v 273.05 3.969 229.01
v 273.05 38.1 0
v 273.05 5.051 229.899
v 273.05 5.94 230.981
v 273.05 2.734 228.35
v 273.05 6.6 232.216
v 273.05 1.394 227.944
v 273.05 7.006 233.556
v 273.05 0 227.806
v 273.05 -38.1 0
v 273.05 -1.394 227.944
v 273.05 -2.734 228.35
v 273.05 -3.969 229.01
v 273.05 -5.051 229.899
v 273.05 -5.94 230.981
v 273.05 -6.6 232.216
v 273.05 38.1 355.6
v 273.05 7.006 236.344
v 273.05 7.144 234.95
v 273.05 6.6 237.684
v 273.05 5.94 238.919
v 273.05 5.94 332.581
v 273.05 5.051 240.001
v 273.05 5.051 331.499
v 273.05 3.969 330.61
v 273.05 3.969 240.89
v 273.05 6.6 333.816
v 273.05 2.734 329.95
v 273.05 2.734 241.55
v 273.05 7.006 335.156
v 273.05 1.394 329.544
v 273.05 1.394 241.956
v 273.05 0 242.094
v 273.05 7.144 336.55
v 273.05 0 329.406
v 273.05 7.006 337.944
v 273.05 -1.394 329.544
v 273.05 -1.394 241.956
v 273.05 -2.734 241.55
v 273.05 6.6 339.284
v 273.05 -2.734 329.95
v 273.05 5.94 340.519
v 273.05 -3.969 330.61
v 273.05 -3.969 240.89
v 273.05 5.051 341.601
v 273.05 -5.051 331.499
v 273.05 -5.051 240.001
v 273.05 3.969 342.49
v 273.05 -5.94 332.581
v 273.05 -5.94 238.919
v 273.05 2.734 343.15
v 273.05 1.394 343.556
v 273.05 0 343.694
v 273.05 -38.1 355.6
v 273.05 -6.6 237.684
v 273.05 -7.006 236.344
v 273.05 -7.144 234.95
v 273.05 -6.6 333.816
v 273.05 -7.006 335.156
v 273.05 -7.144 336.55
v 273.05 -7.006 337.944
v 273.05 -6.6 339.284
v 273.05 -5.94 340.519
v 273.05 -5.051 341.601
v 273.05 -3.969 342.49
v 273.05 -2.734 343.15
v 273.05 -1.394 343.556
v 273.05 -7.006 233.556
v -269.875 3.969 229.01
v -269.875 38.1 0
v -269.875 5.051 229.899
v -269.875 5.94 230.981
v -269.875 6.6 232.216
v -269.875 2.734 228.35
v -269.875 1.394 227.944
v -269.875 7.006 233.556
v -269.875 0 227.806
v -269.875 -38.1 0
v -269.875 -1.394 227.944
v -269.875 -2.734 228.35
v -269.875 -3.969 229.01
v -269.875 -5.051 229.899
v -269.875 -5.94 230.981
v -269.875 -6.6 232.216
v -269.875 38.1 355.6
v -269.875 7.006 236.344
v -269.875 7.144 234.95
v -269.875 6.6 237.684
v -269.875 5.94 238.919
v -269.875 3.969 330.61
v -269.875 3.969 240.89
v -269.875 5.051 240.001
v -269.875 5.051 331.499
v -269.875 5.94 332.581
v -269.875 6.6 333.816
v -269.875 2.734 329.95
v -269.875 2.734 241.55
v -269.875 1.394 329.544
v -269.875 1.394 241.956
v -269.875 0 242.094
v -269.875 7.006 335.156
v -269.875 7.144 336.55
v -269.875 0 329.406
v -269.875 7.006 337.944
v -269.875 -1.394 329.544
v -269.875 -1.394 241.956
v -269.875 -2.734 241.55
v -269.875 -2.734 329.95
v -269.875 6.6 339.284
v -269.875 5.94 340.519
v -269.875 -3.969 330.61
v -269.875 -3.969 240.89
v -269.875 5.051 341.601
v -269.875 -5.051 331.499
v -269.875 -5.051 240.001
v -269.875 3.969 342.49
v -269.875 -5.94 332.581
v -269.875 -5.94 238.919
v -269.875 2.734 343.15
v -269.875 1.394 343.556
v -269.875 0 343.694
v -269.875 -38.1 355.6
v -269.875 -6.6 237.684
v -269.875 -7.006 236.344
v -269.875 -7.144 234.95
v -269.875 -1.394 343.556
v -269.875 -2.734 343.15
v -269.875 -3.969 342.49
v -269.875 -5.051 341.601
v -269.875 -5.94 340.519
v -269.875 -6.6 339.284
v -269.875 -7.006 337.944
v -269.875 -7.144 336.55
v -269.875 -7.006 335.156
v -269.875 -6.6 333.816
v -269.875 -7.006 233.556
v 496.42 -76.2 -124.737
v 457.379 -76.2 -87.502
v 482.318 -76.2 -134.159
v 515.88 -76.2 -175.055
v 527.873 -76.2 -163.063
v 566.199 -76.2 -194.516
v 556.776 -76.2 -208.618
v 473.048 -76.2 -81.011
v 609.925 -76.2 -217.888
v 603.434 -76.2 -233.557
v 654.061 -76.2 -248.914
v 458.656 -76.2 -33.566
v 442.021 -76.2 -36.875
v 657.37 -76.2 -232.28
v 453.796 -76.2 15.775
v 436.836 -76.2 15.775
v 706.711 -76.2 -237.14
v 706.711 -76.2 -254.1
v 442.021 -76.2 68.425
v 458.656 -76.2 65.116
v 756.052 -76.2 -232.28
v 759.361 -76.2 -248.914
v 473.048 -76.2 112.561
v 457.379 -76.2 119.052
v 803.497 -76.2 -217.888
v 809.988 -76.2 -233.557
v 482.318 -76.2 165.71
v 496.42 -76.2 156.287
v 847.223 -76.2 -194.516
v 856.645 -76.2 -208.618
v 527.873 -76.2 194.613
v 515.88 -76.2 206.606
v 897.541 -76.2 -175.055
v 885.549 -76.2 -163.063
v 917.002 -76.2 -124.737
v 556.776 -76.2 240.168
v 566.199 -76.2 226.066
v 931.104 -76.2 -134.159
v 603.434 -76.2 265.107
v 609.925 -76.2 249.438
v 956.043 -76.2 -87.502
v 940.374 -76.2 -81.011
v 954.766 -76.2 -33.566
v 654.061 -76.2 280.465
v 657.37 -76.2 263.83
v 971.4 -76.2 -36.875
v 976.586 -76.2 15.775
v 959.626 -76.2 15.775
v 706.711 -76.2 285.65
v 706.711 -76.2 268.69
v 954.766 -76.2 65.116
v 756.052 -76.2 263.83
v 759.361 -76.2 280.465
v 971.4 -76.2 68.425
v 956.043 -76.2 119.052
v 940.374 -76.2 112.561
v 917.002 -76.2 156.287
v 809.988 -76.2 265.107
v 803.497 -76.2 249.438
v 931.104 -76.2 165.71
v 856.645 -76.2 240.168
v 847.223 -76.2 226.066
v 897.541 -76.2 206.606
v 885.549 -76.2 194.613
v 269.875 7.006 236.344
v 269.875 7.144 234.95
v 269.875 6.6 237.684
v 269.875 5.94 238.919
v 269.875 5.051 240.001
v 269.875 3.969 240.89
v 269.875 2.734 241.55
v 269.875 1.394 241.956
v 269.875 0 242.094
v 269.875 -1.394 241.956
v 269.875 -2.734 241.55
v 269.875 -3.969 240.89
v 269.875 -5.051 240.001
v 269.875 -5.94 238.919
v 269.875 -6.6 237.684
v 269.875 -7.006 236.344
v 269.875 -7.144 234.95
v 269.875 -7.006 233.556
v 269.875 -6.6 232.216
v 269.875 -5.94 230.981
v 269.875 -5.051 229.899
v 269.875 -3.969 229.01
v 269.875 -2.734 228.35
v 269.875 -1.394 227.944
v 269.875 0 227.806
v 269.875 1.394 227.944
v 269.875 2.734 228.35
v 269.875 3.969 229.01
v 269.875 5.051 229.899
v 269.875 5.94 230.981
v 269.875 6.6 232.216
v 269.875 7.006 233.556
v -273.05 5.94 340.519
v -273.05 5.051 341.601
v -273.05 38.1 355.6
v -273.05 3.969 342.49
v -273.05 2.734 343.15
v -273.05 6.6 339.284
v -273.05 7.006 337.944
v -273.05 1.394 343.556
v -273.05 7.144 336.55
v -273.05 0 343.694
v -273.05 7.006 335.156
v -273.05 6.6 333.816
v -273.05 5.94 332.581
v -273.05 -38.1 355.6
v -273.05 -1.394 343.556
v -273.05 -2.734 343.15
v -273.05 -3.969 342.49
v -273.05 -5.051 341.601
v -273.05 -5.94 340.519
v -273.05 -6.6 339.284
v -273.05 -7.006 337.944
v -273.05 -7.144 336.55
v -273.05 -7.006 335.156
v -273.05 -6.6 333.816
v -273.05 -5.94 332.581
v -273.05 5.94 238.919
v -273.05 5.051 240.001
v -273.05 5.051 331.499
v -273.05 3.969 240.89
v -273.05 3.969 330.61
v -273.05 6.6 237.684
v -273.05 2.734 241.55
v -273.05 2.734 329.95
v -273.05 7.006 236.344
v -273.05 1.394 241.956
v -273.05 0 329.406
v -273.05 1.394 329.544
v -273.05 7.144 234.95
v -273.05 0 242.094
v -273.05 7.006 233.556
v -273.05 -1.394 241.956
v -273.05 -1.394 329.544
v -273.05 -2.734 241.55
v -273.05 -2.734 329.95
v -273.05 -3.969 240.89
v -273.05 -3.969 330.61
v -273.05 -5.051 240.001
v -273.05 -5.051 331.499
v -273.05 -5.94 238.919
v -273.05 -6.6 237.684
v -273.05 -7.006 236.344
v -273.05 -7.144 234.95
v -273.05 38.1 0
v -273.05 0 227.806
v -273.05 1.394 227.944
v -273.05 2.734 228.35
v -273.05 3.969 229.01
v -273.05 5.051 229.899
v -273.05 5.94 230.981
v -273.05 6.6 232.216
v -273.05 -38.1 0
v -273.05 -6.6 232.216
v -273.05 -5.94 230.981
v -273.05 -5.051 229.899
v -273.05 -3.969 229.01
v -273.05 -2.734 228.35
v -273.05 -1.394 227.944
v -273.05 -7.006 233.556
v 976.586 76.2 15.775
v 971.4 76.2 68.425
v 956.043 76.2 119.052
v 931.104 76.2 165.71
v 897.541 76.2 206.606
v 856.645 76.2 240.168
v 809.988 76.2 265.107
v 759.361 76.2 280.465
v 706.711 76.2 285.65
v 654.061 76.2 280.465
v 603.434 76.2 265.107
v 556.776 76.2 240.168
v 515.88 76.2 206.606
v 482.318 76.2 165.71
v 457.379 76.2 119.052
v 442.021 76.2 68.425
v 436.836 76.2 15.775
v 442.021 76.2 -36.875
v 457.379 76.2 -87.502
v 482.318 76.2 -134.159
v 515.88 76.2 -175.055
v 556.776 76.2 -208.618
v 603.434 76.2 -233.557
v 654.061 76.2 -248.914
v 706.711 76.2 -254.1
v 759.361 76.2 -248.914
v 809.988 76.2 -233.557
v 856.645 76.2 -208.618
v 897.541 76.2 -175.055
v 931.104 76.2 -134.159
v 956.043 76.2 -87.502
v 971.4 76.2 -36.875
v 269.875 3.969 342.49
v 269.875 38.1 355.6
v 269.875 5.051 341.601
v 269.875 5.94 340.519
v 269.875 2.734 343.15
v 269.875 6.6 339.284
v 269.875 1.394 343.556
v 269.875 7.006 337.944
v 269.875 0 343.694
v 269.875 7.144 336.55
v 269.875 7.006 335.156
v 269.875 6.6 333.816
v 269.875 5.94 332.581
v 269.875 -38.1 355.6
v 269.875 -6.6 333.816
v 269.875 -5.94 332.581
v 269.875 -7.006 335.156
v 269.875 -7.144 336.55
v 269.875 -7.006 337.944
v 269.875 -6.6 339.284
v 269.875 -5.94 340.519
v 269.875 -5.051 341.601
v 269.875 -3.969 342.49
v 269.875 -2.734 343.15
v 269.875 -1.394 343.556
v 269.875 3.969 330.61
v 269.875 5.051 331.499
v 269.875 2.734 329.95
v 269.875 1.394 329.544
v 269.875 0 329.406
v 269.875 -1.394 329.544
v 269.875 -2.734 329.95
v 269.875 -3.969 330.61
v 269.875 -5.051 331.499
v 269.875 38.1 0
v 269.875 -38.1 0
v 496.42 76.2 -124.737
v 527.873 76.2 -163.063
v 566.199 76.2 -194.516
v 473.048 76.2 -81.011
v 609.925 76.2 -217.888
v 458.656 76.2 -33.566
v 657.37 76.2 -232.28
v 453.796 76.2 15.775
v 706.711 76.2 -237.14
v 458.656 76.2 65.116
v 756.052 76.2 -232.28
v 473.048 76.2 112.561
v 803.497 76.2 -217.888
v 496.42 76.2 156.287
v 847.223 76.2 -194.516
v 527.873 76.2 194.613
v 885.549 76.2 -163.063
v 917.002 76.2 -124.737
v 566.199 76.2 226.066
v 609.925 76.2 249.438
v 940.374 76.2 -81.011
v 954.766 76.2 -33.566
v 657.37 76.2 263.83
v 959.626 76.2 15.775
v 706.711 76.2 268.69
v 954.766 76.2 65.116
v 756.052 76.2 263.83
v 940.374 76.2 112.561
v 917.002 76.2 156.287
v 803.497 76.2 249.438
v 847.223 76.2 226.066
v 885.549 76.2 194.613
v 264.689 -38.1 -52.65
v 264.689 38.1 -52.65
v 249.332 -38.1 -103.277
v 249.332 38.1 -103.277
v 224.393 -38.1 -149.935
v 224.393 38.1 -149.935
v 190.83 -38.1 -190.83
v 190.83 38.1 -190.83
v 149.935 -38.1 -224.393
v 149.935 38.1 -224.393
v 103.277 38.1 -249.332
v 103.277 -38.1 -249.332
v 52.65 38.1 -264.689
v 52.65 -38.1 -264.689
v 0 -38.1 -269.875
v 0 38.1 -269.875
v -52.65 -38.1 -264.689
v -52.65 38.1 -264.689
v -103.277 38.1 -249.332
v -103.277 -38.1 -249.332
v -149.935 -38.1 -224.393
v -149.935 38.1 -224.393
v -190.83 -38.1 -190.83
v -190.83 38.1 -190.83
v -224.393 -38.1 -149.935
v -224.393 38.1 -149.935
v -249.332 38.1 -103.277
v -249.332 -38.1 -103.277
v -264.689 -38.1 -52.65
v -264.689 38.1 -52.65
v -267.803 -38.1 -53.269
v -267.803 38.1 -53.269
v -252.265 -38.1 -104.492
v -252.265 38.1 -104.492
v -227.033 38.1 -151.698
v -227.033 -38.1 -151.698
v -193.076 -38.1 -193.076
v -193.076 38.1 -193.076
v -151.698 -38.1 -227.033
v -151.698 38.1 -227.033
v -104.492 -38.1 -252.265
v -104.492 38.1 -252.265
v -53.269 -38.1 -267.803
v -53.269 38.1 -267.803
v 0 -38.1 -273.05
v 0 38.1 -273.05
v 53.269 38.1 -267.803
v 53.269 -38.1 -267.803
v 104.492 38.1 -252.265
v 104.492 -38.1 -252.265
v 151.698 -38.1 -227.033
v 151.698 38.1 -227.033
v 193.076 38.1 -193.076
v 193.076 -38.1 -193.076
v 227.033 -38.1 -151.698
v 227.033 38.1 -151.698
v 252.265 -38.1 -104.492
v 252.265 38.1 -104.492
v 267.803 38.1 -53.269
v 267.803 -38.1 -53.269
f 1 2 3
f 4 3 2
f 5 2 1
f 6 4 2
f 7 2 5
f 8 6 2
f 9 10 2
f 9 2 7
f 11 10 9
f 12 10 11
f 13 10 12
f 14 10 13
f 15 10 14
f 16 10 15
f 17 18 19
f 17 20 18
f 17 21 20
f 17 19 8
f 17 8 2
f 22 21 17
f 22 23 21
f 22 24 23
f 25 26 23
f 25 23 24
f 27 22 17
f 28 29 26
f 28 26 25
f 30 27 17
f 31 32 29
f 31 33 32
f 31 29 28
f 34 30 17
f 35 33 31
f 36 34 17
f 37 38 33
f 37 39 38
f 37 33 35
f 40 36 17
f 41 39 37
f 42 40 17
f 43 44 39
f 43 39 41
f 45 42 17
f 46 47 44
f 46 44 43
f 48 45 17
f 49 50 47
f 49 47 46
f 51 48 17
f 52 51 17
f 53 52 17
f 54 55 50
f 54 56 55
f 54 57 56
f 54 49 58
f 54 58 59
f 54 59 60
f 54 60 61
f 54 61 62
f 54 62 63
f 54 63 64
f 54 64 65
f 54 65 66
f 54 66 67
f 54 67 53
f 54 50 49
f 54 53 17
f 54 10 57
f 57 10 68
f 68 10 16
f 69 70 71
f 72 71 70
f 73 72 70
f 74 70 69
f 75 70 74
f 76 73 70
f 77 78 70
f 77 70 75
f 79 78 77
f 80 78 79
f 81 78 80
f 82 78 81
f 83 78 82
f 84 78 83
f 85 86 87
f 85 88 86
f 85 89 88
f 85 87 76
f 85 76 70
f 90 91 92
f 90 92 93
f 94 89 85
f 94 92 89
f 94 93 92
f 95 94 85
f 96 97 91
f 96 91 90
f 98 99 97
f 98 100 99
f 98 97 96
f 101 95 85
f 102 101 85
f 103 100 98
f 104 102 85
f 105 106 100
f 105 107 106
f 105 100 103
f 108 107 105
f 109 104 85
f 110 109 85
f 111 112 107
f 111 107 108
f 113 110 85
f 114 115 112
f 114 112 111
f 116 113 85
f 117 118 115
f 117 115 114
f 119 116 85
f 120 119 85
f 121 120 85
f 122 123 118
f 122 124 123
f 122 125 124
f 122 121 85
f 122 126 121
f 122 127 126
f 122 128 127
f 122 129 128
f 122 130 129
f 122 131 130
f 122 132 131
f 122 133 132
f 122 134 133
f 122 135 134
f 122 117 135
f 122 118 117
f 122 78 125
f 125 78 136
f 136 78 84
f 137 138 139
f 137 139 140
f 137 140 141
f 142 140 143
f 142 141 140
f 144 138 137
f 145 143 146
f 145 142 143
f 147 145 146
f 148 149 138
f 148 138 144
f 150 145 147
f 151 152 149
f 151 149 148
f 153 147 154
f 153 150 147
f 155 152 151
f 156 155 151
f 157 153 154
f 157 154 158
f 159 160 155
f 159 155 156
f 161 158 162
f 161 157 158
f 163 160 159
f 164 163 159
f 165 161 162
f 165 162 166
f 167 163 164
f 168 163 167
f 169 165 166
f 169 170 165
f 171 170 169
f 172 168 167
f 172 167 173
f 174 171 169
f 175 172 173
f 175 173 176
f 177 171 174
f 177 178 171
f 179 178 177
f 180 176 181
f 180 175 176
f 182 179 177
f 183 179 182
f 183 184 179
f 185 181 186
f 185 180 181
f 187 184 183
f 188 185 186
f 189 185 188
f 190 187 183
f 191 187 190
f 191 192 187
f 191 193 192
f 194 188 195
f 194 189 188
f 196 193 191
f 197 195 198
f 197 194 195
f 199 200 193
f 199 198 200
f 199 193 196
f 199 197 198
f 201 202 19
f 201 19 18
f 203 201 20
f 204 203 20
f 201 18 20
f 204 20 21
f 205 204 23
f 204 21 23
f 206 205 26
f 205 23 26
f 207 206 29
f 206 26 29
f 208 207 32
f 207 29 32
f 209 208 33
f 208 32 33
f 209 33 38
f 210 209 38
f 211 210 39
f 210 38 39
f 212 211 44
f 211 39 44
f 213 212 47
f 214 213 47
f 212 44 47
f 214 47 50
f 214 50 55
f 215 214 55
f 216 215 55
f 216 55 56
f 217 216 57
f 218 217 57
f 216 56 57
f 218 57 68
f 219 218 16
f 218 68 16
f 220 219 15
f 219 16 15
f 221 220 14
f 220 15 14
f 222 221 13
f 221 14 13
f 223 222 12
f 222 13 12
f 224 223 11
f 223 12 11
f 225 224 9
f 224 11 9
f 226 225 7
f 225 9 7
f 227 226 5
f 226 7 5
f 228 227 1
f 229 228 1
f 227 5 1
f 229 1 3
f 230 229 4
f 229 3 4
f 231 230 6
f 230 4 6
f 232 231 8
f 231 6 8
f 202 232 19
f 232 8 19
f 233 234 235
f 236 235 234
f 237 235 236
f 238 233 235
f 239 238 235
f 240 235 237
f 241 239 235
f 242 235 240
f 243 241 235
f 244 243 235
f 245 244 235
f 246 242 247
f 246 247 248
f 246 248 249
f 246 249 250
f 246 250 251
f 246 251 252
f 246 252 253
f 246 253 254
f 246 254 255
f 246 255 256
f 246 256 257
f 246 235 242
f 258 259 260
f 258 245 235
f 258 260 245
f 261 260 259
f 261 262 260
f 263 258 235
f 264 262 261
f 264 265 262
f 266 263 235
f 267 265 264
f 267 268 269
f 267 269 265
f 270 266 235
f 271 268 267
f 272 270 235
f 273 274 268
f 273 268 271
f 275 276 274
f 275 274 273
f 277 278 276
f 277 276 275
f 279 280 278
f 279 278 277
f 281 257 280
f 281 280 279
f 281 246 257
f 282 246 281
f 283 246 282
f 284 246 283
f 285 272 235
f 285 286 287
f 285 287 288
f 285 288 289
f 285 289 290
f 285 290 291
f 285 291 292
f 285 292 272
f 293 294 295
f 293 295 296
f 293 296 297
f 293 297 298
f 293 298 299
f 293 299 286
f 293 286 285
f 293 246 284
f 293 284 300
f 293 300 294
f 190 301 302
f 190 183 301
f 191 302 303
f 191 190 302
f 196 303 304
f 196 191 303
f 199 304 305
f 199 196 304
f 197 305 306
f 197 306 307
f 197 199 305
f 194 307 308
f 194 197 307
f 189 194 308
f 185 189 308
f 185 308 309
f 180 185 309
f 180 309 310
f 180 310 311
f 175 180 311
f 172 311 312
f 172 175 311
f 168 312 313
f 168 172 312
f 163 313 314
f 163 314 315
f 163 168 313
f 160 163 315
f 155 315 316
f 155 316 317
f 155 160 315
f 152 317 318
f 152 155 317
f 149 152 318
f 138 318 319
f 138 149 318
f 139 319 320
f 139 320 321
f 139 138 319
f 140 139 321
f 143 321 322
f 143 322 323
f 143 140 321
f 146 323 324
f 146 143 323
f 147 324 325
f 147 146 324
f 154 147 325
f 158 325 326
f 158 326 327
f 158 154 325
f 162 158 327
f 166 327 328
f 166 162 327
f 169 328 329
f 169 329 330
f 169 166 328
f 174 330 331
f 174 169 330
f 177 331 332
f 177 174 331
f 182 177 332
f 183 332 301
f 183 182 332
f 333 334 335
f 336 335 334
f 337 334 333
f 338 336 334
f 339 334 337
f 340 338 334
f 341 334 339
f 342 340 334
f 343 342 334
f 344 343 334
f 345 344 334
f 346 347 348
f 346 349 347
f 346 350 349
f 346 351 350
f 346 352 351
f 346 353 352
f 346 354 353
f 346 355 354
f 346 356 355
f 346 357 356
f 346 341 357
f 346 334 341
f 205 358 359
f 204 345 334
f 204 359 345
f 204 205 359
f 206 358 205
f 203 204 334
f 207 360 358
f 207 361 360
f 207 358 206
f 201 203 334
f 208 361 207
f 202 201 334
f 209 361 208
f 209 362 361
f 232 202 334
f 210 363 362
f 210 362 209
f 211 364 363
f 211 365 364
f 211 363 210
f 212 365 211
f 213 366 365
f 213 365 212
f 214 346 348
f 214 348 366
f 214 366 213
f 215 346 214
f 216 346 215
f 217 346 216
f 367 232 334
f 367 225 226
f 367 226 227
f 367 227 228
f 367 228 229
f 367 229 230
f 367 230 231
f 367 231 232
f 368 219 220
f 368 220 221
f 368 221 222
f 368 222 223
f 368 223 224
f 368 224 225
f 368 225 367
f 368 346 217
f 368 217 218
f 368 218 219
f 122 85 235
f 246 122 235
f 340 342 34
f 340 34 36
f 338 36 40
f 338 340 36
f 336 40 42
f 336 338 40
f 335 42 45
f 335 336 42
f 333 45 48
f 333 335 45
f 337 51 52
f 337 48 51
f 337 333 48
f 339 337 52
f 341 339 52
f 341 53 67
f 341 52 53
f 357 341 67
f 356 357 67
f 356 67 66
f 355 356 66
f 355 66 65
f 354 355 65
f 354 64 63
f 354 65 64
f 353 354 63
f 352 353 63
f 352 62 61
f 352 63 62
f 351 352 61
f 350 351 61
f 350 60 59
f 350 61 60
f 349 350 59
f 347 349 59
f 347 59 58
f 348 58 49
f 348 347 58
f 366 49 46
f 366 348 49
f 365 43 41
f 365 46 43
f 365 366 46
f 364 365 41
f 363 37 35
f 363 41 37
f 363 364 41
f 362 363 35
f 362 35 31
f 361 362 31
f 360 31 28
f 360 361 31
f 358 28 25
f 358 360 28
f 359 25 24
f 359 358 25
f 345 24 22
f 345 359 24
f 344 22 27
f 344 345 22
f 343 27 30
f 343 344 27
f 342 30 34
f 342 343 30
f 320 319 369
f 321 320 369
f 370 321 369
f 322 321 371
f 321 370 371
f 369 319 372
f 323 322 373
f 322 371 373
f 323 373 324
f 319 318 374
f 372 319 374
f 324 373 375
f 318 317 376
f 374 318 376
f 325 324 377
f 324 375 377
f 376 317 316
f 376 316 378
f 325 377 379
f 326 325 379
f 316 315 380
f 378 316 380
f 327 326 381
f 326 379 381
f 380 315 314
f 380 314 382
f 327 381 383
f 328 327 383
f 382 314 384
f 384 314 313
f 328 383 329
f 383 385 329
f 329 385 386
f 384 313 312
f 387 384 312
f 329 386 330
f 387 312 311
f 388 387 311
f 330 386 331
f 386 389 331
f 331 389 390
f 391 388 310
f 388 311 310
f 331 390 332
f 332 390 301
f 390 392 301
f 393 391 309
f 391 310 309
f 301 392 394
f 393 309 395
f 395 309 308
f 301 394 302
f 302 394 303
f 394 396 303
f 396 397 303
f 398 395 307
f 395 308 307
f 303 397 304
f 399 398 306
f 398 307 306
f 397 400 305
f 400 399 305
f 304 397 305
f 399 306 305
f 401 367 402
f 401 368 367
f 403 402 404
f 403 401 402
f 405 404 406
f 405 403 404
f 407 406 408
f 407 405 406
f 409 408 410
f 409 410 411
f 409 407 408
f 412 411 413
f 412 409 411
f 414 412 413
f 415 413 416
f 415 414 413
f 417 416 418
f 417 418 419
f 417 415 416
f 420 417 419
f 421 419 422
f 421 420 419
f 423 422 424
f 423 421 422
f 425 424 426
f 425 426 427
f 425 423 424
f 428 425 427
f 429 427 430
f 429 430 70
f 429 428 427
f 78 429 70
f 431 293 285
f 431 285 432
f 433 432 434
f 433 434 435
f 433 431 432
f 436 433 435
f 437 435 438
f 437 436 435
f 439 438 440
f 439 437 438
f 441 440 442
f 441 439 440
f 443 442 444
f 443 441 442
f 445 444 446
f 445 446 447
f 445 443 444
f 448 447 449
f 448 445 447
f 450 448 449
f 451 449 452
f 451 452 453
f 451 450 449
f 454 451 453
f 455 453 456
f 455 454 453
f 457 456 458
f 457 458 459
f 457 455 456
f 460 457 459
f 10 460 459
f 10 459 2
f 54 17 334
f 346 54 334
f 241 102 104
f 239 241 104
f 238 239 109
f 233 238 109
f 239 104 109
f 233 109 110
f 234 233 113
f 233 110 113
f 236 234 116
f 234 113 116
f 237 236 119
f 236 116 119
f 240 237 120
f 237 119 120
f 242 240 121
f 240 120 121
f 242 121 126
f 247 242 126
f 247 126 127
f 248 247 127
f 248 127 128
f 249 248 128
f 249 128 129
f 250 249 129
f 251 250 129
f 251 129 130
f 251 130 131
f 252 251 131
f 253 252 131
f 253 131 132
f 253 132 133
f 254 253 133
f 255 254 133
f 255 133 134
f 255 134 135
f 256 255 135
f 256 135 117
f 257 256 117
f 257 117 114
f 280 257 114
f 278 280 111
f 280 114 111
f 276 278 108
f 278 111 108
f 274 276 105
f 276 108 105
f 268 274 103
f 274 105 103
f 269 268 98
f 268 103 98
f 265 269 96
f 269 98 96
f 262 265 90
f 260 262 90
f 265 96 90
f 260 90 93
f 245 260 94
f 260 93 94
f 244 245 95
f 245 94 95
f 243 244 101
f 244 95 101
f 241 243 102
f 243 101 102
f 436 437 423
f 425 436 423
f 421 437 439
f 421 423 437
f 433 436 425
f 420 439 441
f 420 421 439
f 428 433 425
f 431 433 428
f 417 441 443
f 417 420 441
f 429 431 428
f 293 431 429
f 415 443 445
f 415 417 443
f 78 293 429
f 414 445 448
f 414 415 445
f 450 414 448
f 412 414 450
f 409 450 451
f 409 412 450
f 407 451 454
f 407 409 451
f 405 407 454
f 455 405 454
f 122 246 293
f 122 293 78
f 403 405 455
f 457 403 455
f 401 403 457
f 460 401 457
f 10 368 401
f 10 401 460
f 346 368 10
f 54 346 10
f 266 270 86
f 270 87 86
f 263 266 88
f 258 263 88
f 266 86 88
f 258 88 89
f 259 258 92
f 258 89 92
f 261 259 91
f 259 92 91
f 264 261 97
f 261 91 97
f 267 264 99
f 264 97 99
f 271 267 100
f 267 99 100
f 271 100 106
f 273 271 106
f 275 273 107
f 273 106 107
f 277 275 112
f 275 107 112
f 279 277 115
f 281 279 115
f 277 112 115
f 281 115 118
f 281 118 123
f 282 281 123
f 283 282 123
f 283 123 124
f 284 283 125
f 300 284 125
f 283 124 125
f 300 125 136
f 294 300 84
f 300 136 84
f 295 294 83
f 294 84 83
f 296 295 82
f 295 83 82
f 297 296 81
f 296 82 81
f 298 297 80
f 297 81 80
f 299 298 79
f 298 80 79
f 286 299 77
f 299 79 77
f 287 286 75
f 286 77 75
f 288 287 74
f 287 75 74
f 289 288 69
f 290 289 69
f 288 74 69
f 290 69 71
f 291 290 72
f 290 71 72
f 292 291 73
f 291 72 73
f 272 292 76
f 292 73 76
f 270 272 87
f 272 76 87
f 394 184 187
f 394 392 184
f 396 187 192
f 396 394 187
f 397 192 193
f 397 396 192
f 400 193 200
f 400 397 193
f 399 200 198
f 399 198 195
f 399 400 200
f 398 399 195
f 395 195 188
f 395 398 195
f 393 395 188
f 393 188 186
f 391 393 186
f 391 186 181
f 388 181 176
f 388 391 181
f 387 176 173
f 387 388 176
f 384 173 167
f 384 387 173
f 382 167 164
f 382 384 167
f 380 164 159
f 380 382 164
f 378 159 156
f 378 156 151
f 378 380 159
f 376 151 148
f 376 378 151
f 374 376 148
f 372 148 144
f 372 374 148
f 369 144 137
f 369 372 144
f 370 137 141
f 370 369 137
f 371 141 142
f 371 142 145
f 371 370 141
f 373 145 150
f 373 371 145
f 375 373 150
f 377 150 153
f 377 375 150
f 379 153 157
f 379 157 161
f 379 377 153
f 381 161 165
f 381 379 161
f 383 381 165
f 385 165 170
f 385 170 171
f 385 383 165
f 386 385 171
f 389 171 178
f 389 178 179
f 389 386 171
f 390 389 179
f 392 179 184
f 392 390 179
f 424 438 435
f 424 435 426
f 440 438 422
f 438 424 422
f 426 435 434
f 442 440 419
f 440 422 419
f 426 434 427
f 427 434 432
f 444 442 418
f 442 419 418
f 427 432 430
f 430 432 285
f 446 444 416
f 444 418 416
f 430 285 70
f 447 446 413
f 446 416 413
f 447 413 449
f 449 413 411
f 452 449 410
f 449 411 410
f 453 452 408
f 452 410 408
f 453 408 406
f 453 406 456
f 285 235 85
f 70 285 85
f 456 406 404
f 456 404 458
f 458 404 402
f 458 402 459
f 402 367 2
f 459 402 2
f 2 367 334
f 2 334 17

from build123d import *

# Parameters (mm, degrees)
F1_DEPTH = 38.1
F2_R     = 7.14375
F3_DEPTH = 317.5
F4_R     = 269.875
F4_R_2   = 252.914698
F5_DEPTH = 76.2


with BuildPart() as f1:
    # F0 (on Front) → F1 (new body, symmetric)
    with BuildSketch(Plane.XZ):
        with BuildLine():
            ThreePointArc((269.875, 0), (0, -269.875), (-269.875, 0))
            Line((-269.875, 0), (-269.875, 355.6))
            Line((-269.875, 355.6), (-273.05, 355.6))
            Line((-273.05, 355.6), (-273.05, 0))
            ThreePointArc((-273.05, 0), (0, -273.05), (273.05, 0))
            Line((273.05, 0), (273.05, 355.6))
            Line((273.05, 355.6), (269.875, 355.6))
            Line((269.875, 355.6), (269.875, 0))
        make_face()
    extrude(amount=F1_DEPTH, both=True)

    # F2 (on Right) → F3 (cut, symmetric)
    with BuildSketch(Plane.YZ):
        with Locations((0, 336.55)):
            Circle(F2_R)
        with Locations((0, 234.95)):
            Circle(F2_R)
    extrude(amount=F3_DEPTH, both=True, mode=Mode.SUBTRACT)


with BuildPart() as f5:
    # F4 (on Front) → F5 (new body, symmetric)
    with BuildSketch(Plane.XZ):
        with Locations((706.710875, 15.77512)):
            Circle(F4_R)
        with Locations((706.710875, 15.77512)):
            Circle(F4_R_2, mode=Mode.SUBTRACT)
    extrude(amount=F5_DEPTH, both=True)


solid = Compound([f1.part, f5.part])
